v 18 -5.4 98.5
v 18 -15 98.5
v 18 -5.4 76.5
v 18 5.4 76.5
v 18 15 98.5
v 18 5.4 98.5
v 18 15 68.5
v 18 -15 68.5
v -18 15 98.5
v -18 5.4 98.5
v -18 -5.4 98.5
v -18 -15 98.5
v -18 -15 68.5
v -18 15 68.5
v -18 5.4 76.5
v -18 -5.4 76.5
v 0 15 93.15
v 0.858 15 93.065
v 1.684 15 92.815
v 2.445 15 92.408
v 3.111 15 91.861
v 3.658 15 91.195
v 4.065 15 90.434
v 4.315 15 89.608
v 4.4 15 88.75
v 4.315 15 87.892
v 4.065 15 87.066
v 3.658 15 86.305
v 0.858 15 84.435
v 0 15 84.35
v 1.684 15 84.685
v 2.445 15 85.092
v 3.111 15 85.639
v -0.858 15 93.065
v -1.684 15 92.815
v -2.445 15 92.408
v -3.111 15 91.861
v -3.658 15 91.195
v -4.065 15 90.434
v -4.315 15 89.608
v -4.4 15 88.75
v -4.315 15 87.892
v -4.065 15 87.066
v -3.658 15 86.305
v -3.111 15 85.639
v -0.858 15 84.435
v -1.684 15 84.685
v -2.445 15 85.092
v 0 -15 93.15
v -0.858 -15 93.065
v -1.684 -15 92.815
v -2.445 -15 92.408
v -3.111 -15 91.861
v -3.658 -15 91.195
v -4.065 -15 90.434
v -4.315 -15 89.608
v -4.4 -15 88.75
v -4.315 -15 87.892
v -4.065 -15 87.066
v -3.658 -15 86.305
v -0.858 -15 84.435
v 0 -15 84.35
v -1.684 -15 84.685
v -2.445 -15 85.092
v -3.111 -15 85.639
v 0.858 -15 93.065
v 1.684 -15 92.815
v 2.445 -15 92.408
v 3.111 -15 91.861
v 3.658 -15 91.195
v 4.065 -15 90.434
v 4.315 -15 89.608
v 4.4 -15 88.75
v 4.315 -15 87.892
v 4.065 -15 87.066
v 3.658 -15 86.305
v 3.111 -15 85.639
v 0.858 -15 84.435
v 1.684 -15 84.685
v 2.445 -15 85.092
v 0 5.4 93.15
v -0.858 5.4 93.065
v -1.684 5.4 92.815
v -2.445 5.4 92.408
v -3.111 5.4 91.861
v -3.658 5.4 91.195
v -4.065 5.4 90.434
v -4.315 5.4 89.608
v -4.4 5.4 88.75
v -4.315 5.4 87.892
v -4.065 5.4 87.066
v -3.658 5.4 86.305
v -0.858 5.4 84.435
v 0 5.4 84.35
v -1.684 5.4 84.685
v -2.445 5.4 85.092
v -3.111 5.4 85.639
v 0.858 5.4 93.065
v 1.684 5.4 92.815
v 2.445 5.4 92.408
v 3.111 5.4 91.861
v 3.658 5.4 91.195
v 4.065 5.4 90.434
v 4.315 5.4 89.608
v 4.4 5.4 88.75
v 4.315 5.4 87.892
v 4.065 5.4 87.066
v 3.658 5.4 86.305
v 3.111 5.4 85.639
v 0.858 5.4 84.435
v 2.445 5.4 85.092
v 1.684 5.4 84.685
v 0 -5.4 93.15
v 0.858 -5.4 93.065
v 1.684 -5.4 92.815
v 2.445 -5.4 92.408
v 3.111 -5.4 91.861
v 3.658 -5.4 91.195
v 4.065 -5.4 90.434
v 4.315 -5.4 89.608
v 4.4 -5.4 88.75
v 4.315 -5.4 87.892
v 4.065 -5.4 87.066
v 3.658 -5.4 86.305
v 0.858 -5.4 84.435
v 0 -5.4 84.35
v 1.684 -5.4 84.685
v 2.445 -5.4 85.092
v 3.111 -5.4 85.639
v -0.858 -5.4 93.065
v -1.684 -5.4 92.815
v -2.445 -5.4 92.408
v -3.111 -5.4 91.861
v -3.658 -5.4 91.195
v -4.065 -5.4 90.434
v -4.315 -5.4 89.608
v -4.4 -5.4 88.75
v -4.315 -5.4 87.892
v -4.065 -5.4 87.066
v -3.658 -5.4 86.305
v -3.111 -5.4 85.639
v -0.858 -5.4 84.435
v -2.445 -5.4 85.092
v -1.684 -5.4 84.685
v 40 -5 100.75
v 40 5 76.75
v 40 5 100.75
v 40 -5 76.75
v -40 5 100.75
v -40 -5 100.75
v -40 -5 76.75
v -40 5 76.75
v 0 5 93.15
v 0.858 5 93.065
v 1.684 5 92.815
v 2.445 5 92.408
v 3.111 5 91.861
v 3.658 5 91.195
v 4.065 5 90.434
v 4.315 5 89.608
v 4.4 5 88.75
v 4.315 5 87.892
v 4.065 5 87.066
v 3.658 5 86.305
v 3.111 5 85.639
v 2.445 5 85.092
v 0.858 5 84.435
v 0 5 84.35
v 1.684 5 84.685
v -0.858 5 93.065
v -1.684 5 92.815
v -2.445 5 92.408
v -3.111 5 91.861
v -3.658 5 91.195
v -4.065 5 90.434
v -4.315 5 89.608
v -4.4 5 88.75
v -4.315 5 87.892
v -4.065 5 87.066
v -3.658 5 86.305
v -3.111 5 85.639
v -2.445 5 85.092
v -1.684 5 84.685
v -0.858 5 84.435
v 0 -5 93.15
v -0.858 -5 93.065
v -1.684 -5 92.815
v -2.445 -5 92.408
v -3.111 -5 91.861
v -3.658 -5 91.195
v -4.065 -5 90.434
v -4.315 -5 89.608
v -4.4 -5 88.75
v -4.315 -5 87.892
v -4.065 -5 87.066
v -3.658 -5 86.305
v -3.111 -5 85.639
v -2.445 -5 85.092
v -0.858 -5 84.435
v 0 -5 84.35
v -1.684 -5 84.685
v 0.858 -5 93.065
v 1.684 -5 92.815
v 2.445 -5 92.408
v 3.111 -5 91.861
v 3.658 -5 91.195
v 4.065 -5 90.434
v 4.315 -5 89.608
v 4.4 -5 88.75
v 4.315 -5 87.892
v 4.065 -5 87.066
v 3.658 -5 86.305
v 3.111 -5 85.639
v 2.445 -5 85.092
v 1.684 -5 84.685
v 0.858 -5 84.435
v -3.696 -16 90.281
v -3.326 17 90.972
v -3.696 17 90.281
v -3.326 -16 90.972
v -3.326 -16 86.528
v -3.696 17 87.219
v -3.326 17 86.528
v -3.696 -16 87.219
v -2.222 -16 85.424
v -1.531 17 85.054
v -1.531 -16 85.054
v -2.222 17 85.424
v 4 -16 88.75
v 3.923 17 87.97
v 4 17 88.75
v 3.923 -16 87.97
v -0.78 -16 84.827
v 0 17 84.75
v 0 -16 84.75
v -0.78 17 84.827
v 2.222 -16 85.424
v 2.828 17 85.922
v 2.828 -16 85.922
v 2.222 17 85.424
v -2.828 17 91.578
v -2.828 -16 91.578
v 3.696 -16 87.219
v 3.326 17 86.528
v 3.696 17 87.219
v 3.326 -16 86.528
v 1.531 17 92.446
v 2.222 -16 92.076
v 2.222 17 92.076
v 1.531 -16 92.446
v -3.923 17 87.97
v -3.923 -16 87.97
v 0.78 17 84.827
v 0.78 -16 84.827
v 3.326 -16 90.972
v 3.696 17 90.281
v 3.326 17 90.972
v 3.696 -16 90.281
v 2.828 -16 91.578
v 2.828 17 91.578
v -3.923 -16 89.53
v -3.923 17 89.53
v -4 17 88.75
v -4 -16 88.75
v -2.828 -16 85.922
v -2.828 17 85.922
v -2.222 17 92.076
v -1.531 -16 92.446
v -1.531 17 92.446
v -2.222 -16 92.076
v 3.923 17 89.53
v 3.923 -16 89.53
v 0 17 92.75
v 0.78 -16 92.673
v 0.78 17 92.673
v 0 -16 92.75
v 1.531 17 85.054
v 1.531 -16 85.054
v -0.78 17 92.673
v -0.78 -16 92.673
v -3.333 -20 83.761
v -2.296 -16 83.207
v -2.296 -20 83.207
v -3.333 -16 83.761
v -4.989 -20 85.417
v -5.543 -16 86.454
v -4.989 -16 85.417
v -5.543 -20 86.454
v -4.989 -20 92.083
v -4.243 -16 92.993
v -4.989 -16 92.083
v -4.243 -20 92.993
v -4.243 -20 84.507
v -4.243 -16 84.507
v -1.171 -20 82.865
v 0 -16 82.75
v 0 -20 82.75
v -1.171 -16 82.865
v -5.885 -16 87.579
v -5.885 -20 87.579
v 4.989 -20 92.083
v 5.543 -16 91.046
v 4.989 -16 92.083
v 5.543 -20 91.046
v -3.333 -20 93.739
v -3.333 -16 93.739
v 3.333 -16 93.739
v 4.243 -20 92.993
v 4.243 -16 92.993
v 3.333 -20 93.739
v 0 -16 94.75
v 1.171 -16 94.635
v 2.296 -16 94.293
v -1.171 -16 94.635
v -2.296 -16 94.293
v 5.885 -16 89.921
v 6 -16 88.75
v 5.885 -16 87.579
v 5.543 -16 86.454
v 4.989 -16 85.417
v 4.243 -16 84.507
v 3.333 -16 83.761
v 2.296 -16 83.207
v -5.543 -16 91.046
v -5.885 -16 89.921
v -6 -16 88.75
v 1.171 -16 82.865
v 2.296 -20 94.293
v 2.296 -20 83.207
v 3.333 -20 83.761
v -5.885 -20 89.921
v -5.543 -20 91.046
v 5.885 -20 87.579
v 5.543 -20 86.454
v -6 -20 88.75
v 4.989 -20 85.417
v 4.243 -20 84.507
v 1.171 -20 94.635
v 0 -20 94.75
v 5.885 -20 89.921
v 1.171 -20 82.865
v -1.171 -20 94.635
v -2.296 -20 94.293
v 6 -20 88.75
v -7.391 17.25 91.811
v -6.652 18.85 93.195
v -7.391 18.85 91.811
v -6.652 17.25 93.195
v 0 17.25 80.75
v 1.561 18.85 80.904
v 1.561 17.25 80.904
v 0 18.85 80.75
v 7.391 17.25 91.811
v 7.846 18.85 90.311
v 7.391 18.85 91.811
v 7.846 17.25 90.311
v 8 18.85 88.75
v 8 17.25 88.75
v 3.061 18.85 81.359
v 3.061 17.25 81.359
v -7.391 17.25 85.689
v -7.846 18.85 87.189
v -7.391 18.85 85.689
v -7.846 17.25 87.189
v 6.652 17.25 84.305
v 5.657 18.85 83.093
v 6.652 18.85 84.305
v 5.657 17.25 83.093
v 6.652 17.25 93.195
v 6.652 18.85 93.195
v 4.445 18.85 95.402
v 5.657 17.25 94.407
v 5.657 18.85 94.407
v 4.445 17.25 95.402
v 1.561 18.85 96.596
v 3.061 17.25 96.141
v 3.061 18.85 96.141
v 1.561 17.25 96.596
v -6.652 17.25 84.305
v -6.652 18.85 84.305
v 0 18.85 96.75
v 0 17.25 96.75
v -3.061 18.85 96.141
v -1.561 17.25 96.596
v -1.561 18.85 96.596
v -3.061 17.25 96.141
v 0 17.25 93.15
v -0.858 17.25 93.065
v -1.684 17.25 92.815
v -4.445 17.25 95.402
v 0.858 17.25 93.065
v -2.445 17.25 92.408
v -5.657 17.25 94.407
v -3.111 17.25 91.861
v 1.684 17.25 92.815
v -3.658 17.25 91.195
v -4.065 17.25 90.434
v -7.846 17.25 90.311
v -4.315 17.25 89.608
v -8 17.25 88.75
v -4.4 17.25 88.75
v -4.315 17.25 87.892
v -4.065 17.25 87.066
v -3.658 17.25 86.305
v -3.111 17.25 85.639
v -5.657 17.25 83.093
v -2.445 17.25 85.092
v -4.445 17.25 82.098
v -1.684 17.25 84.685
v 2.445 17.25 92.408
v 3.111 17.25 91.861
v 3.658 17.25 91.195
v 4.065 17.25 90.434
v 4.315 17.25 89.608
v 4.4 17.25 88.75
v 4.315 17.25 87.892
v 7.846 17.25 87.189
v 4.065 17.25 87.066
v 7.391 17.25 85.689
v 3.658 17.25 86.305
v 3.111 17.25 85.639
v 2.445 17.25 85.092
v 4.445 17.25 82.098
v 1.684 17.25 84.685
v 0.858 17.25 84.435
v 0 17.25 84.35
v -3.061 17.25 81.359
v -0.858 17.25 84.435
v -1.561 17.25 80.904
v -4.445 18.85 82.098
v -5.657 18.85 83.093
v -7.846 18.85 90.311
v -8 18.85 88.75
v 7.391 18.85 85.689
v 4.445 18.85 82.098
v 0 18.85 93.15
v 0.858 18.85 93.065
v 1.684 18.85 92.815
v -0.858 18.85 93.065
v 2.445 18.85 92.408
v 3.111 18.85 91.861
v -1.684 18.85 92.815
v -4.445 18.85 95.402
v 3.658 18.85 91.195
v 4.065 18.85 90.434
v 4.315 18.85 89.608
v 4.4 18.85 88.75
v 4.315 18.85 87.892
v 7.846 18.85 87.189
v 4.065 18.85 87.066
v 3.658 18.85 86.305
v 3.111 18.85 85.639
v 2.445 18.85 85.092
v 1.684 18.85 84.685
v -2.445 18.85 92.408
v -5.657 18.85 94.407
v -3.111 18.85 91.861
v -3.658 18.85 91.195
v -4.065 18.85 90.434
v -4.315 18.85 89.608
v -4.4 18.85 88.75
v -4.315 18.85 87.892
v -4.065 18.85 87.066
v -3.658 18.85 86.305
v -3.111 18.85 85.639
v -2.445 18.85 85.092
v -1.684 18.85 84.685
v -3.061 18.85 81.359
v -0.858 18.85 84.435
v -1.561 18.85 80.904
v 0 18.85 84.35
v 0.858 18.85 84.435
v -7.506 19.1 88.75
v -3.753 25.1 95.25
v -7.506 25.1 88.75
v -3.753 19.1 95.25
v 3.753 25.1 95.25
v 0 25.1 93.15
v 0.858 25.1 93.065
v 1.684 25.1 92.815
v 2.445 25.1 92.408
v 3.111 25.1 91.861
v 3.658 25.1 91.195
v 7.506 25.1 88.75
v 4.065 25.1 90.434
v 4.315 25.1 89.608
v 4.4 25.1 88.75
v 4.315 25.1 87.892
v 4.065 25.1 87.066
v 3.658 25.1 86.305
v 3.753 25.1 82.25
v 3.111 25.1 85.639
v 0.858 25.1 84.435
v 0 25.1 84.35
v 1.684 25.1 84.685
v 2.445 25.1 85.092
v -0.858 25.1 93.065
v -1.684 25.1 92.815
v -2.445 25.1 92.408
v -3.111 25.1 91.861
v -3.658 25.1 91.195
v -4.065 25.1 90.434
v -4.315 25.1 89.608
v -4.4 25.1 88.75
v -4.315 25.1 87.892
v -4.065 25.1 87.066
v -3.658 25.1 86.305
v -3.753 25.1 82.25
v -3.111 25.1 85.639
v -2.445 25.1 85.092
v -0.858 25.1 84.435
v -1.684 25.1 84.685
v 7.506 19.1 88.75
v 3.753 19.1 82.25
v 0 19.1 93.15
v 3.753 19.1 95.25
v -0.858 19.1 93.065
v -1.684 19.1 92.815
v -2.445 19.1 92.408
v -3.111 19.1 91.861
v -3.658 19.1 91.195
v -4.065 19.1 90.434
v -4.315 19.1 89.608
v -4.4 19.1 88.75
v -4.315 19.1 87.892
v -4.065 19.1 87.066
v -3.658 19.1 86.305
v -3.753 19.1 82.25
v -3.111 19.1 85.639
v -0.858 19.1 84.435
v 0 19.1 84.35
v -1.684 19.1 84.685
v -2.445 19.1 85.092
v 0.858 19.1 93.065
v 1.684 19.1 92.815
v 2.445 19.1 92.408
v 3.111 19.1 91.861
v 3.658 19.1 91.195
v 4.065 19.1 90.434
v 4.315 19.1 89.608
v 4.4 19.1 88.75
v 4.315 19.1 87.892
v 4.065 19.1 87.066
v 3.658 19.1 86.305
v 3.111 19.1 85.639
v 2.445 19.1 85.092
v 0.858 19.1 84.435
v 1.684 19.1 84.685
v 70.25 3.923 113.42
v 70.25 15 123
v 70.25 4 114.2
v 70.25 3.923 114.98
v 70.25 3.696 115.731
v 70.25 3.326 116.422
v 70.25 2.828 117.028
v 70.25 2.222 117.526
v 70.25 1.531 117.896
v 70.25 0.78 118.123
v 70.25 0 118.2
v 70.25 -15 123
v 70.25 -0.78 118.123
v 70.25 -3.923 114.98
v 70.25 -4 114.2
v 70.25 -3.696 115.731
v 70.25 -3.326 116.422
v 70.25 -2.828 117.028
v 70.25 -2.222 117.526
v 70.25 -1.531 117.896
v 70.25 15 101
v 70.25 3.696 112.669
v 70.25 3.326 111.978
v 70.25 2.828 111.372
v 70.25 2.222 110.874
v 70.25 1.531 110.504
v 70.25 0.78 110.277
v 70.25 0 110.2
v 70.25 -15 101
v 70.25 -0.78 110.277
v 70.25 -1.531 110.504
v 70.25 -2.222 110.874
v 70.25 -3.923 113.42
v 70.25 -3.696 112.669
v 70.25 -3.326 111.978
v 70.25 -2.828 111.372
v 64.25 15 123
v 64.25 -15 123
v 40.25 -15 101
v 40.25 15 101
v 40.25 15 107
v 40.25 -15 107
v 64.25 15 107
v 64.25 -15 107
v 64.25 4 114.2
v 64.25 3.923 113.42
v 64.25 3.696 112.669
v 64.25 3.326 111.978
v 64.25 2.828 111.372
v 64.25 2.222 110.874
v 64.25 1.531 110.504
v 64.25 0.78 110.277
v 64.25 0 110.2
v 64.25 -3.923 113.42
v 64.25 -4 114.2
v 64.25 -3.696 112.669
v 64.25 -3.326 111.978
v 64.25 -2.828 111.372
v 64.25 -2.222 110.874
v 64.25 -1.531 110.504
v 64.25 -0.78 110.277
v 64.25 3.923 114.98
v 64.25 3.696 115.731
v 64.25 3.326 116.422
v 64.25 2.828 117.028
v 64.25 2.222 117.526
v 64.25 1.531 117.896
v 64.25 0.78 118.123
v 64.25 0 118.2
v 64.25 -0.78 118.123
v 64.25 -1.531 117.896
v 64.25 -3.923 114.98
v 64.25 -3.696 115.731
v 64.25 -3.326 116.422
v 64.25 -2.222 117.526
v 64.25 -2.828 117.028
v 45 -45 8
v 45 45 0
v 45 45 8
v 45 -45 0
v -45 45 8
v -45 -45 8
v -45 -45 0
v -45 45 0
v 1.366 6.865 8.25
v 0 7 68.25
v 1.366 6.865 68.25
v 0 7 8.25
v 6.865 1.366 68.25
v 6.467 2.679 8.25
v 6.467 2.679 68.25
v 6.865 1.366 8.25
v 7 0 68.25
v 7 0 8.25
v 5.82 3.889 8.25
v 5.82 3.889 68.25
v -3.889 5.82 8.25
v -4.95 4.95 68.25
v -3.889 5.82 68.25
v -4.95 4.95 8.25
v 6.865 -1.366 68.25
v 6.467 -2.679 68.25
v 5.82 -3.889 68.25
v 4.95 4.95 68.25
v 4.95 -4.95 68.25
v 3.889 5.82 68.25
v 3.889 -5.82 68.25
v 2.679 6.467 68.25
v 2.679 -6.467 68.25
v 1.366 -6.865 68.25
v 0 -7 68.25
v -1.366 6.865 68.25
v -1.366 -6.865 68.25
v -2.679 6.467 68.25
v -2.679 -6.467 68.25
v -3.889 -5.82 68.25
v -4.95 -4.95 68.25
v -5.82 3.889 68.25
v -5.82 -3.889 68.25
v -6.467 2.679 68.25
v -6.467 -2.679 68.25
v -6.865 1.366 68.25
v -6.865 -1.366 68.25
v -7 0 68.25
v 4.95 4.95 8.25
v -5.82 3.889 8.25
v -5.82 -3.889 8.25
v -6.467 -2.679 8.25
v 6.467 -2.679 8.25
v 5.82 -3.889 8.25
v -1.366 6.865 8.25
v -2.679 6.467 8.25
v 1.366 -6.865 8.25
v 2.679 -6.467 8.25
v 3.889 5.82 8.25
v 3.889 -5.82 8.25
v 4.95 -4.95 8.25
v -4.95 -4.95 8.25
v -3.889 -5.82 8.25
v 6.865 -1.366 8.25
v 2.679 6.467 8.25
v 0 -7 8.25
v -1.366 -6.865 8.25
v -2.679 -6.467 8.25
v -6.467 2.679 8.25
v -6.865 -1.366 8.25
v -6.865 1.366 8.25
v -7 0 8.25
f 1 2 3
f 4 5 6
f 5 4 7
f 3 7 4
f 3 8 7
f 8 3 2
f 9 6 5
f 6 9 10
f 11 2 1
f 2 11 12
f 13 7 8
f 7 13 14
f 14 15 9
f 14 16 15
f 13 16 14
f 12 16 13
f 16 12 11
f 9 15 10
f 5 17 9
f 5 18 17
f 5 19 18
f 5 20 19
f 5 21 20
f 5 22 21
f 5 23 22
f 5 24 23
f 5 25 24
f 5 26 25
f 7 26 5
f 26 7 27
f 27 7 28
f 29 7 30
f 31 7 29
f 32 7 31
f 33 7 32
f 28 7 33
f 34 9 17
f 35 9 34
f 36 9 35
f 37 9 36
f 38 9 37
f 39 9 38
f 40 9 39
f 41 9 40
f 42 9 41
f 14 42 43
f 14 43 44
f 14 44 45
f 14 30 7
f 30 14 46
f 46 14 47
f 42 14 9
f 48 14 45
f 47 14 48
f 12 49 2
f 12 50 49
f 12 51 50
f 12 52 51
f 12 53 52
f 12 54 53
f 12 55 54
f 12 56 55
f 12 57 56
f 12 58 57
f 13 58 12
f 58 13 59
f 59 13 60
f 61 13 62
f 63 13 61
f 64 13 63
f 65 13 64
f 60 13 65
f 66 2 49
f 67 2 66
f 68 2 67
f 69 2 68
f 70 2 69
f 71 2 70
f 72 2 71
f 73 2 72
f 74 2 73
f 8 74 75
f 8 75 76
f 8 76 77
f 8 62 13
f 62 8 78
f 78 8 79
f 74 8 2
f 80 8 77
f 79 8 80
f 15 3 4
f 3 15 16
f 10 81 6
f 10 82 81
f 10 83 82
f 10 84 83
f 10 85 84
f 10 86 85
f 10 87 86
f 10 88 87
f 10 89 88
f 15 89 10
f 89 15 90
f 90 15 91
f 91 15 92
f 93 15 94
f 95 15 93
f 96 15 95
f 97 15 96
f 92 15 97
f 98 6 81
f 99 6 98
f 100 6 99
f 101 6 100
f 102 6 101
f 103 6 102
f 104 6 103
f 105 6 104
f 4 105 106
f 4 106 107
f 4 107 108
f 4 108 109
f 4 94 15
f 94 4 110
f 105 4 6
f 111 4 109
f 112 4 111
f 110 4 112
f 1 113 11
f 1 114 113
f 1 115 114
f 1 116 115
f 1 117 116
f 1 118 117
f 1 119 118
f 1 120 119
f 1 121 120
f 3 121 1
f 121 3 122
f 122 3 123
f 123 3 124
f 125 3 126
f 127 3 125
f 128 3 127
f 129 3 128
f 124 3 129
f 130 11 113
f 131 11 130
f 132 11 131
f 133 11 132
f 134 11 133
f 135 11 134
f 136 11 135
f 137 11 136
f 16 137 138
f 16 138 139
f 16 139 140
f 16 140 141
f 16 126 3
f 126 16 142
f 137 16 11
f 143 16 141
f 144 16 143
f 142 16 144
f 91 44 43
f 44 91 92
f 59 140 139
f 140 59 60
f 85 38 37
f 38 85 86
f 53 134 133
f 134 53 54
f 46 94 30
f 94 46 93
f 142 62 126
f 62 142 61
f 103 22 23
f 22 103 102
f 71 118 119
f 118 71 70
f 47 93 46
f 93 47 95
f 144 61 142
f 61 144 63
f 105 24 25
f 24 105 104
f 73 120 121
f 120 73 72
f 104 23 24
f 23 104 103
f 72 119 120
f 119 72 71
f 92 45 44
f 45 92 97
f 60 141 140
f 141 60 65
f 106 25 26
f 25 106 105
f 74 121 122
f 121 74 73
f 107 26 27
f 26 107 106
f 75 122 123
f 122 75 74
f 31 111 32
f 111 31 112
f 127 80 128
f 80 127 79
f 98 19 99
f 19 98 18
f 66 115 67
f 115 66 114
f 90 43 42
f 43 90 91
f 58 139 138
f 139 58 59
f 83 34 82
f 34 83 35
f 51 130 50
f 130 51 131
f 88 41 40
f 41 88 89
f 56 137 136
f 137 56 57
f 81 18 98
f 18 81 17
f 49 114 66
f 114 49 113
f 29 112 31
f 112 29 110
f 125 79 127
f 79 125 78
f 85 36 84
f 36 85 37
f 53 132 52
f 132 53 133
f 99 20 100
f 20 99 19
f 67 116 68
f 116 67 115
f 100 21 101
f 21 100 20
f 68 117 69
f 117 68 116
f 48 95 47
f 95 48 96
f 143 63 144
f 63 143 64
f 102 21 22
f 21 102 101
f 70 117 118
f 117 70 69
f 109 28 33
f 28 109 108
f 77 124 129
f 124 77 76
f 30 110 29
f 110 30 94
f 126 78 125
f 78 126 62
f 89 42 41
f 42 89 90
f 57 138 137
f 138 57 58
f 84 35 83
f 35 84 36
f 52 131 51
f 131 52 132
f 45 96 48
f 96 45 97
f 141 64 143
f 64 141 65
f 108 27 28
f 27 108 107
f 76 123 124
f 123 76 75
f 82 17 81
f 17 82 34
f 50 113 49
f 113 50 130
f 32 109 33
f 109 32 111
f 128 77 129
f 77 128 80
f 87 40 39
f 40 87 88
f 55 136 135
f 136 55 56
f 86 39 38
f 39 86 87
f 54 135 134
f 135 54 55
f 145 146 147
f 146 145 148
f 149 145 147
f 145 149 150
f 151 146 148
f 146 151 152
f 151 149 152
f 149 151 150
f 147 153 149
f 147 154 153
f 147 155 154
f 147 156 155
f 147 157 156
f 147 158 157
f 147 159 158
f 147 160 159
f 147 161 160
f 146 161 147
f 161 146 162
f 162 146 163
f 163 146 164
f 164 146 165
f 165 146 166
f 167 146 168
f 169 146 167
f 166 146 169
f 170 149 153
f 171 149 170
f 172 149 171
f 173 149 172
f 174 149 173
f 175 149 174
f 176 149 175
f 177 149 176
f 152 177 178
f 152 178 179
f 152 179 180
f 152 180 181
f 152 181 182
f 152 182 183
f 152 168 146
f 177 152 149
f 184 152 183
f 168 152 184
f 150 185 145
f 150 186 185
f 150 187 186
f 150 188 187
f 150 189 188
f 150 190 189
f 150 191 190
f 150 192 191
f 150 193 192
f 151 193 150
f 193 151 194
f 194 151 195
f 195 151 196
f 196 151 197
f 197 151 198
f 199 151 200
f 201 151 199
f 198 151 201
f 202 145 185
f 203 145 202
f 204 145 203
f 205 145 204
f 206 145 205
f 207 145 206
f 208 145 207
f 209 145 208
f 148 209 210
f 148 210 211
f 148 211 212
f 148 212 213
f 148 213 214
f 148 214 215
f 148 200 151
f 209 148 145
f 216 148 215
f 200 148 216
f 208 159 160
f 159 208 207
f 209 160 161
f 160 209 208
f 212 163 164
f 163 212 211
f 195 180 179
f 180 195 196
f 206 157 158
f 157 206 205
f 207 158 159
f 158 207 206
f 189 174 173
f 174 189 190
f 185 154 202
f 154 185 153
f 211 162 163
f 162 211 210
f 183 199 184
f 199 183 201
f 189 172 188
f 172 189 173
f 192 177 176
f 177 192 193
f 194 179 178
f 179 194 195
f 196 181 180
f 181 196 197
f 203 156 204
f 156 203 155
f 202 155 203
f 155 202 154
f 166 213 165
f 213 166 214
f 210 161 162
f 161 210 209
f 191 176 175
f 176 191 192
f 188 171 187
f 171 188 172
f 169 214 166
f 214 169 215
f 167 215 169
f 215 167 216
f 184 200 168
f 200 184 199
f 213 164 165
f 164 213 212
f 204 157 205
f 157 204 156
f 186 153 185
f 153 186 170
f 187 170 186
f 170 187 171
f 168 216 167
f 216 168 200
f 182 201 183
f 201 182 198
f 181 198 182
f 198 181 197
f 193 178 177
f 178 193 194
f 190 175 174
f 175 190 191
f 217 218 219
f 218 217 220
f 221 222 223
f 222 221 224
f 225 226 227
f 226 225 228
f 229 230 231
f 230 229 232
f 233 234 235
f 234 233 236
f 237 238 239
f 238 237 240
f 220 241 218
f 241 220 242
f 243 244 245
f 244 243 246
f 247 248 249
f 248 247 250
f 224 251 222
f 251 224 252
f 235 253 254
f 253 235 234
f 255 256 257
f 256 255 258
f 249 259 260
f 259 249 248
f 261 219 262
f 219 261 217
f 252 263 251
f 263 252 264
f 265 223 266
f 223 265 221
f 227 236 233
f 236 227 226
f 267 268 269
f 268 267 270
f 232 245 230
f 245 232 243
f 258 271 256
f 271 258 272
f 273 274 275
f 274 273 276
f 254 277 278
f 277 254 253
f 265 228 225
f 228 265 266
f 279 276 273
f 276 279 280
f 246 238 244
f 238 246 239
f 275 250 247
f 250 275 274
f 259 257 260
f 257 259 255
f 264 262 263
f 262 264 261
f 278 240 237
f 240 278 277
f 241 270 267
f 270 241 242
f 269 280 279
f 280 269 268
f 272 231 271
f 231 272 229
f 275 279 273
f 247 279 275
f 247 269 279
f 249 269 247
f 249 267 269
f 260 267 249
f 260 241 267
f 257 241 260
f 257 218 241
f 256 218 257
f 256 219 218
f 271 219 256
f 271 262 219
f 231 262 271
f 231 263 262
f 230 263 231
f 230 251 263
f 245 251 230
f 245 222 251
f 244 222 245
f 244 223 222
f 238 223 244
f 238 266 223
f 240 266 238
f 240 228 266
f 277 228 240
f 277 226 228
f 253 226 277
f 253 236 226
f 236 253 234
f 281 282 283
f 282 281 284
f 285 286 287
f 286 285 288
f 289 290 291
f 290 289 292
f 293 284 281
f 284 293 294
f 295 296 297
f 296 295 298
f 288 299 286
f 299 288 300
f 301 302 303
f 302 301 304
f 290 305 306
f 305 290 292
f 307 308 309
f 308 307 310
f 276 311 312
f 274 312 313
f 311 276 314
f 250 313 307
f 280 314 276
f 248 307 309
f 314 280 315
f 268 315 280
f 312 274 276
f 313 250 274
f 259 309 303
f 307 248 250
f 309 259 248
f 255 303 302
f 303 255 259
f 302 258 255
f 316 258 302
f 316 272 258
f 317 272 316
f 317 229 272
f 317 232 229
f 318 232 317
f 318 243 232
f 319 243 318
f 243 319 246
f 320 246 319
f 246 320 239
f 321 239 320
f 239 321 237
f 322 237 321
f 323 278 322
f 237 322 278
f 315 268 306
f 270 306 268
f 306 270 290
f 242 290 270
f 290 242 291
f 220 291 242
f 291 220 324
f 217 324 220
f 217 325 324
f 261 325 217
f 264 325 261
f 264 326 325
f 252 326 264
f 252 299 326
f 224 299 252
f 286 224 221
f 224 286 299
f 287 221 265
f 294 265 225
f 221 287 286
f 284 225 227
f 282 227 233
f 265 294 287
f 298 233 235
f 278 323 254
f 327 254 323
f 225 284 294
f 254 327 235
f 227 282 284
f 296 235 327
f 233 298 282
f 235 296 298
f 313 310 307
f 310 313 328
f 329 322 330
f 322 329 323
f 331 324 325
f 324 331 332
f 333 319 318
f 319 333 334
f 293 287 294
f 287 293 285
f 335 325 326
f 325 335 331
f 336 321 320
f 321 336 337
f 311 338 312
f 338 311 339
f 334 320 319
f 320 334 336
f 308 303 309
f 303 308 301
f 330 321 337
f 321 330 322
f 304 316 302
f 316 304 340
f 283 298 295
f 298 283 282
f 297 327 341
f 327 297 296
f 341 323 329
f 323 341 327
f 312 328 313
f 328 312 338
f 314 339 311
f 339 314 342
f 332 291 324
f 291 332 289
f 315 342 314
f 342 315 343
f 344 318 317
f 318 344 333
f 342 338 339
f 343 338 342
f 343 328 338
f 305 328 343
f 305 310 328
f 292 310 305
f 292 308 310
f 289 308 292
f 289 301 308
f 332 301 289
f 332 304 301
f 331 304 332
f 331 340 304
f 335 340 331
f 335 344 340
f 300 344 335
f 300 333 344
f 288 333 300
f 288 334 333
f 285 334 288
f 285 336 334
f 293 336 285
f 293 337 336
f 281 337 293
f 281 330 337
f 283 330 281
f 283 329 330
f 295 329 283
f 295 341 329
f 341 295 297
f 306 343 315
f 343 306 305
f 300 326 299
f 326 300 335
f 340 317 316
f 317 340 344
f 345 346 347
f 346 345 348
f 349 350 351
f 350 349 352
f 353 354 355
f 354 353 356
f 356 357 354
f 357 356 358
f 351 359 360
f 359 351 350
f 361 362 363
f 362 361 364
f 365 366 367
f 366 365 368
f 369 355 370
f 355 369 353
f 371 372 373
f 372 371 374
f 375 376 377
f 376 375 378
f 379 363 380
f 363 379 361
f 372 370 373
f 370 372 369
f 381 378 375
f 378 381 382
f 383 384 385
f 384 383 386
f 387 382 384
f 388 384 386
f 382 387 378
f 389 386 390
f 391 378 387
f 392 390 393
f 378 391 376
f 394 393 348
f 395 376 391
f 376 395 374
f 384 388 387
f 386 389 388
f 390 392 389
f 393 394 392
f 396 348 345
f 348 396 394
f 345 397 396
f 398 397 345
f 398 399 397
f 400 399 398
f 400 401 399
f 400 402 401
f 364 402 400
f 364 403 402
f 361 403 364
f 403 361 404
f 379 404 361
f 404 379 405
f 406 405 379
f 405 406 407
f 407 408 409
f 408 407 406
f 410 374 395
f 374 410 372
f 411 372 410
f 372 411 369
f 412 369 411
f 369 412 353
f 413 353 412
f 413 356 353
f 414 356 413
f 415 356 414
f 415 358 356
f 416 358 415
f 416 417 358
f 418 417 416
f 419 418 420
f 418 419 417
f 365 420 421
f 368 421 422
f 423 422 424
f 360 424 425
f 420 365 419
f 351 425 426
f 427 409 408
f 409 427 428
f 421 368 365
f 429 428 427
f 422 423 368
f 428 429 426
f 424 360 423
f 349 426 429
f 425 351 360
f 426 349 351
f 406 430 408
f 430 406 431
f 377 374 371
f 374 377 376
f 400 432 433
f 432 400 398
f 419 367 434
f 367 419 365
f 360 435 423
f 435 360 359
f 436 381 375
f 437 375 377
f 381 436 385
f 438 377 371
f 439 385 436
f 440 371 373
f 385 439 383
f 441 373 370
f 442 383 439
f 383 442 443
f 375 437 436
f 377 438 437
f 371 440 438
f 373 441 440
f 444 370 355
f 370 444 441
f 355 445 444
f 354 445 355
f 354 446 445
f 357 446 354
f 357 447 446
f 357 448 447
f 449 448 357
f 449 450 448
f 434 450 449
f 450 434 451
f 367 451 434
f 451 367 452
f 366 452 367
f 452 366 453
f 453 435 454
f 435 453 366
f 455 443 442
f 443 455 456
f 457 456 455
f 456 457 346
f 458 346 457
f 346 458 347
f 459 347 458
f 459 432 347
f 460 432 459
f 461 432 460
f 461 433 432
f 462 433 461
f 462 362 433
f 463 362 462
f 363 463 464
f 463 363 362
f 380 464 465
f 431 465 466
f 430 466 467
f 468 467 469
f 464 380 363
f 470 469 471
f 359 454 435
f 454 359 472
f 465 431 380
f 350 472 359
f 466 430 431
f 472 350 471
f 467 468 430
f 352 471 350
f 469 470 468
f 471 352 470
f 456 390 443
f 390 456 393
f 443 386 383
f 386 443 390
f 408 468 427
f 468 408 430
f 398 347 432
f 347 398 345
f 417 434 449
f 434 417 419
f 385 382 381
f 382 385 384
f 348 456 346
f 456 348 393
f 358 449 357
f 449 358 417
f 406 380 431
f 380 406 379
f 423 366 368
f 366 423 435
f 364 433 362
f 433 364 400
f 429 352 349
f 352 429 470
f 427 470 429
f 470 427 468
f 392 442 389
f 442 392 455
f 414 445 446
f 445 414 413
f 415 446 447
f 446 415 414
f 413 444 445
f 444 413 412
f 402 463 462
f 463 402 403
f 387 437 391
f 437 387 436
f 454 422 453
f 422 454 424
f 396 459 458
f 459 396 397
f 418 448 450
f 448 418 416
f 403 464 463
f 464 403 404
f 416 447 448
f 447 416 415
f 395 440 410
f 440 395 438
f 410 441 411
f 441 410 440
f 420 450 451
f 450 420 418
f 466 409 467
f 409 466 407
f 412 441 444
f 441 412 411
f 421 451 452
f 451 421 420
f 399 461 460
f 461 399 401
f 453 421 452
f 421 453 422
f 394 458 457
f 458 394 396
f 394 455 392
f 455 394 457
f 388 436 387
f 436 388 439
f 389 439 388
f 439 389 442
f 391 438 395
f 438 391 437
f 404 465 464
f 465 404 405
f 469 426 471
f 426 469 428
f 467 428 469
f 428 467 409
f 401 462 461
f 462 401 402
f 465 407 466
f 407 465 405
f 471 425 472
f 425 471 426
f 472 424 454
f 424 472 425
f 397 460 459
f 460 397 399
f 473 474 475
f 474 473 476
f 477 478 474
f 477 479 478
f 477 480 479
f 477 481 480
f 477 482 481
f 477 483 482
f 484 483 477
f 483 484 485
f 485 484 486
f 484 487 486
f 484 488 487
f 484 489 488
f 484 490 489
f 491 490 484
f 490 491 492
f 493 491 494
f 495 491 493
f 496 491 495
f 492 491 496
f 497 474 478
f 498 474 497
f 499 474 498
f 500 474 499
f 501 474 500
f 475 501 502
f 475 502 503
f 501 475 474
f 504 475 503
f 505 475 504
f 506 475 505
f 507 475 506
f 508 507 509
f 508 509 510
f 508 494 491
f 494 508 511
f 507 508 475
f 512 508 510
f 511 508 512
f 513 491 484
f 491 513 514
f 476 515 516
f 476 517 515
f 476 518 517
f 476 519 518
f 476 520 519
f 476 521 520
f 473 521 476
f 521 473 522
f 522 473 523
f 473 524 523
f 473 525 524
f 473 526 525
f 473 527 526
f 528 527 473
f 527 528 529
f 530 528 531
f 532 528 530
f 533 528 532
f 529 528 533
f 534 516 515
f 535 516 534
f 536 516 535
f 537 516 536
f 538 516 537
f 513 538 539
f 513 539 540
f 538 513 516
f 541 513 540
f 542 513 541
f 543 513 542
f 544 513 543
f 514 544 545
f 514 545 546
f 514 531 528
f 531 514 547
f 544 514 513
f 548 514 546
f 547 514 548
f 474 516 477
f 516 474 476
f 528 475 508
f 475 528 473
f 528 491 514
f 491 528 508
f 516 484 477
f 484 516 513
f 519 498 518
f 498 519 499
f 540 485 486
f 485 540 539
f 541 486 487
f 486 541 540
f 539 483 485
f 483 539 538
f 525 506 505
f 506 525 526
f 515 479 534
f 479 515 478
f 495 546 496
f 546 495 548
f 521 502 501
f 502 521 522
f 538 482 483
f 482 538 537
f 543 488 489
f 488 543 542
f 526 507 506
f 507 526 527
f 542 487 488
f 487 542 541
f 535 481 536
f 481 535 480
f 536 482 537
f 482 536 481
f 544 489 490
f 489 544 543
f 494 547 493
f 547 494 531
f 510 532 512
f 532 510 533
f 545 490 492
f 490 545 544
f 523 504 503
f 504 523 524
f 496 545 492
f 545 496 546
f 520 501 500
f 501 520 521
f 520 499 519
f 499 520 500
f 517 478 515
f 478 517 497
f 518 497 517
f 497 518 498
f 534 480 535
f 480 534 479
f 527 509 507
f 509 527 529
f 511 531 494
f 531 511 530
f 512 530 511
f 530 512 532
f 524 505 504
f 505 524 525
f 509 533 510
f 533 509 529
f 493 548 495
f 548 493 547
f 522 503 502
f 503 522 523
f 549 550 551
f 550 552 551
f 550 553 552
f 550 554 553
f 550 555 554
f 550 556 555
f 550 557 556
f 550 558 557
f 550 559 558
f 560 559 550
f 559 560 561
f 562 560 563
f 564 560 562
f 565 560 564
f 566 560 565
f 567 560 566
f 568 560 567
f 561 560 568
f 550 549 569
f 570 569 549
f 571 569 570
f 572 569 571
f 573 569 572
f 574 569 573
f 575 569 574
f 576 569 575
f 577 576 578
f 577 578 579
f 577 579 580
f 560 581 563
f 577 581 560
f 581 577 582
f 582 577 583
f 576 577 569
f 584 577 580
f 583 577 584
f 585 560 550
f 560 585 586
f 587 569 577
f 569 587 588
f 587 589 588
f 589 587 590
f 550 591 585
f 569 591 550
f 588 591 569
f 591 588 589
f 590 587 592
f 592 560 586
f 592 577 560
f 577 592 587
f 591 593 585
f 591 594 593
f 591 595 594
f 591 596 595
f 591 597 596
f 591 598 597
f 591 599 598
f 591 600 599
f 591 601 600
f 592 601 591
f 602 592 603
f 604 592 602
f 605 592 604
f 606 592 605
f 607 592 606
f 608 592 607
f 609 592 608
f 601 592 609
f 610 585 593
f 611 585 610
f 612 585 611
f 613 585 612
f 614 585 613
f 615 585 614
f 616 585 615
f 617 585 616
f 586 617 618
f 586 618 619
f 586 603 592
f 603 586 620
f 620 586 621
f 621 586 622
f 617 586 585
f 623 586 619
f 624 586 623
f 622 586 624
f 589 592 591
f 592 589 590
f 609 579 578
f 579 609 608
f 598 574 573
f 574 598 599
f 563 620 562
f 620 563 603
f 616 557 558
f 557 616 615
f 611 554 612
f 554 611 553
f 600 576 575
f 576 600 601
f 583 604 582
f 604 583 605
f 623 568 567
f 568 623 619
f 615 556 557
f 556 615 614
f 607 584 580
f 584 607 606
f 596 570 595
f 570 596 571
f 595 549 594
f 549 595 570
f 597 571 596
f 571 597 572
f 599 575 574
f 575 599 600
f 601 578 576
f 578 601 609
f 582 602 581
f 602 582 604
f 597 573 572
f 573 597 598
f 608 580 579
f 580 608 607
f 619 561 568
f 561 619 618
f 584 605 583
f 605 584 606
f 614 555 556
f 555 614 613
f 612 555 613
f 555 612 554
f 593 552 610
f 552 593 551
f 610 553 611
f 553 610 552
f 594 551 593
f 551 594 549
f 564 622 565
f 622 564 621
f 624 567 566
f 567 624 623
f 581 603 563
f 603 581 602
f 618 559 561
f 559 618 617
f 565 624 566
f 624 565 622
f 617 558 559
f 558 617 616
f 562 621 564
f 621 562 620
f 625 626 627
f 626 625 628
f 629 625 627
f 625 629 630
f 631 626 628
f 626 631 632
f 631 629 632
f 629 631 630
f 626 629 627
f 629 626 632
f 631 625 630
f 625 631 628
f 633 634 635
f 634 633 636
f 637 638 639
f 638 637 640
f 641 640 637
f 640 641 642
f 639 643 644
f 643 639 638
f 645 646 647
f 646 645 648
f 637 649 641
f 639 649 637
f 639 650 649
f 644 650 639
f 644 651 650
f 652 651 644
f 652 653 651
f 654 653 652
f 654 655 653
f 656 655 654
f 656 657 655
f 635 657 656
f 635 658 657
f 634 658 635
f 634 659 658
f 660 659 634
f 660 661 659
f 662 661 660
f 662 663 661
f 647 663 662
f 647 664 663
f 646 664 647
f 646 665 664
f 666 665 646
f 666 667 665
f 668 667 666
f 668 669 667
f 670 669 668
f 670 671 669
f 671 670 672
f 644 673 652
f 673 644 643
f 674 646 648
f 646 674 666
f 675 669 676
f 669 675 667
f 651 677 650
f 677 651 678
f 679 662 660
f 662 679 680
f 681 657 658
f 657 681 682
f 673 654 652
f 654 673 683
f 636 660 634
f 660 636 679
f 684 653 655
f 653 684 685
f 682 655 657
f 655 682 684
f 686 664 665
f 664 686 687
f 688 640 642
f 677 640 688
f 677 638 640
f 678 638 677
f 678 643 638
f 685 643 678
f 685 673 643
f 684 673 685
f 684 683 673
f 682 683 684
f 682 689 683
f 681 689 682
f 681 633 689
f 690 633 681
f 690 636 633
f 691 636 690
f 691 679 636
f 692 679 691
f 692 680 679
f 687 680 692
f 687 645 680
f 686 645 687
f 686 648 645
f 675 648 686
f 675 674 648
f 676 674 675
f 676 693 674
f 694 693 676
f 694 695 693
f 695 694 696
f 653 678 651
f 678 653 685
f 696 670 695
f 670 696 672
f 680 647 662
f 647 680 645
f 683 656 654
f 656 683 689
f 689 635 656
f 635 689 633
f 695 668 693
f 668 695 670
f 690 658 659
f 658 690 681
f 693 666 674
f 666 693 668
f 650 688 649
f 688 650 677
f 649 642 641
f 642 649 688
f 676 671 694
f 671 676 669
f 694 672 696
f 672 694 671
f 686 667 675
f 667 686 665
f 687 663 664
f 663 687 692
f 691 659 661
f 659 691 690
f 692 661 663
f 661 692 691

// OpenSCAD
$fn = 32;

// ------------------------------------------------------------------------
// Lamp arm: column d14 x 60 mm, arm 80 mm
// Every part is its own module, assembly() places every instance.
// ------------------------------------------------------------------------

// --- part 1 ---
module lamp_base() {
  difference() {
    translate([-45, -45, 0]) cube([90, 90, 8]);
  }
}

// --- part 2 ---
module lamp_column() {
  cylinder(h = 60, d = 14);
}

// --- part 3 ---
module head_fork() {
  difference() {
    translate([-18, -15, 0]) cube([36, 30, 30]);
    translate([-19, -5.4, 8]) cube([38, 10.8, 23]);
    translate([0, 0, 20.25]) rotate([90, 0, 0]) cylinder(h = 32, d = 8.8, center = true);
  }
}

// --- part 4 ---
module lamp_arm() {
  difference() {
    translate([-40, -5, 0]) cube([80, 10, 24]);
    translate([0, 0, 12]) rotate([90, 0, 0]) cylinder(h = 12, d = 8.8, center = true);
  }
}

// --- part 5 ---
module arm_pin() {
  rotate([0, 90, 0]) cylinder(h = 34, d = 8, center = true);
  translate([-20, 0, 0]) rotate([0, 90, 0]) cylinder(h = 4, d = 12);
}

// --- part 6 ---
module arm_washer() {
  difference() {
      translate([0, 0, 0]) cylinder(h = 1.6, d = 16);
      translate([0, 0, -1]) cylinder(h = 3.6, d = 8.8);
    }
}

// --- part 7 ---
module arm_nut() {
  difference() {
    linear_extrude(height = 6) polygon(points = [[7.506, 0], [3.753, 6.5], [-3.753, 6.5], [-7.506, 0], [-3.753, -6.5], [3.753, -6.5]]);
    translate([0, 0, -1]) cylinder(h = 8, d = 8.8);
  }
}

// --- part 8 ---
module shade_bracket() {
  difference() {
    translate([-15, -15, 0]) cube([30, 30, 22]);
    translate([-16, -16, 6]) cube([25, 32, 17]);
    translate([12, 0, 13.2]) rotate([0, 90, 0]) cylinder(h = 8, d = 8, center = true);
  }
}

// --- assembly ---
module assembly() {
  color([0.80, 0.24, 0.20]) translate([0, 0, 0]) rotate([0, 0, 0]) lamp_base();
  color([0.20, 0.45, 0.75]) translate([0, 0, 8.25]) rotate([0, 0, 0]) lamp_column();
  color([0.25, 0.62, 0.32]) translate([0, 0, 68.5]) rotate([0, 0, 0]) head_fork();
  color([0.92, 0.70, 0.18]) translate([0, 0, 76.75]) rotate([0, 0, 0]) lamp_arm();
  color([0.58, 0.35, 0.70]) translate([0, 0, 88.75]) rotate([0, 0, 90]) arm_pin();
  color([0.16, 0.66, 0.66]) translate([0, 18.85, 88.75]) rotate([90, 0, 0]) arm_washer();
  color([0.85, 0.48, 0.18]) translate([0, 25.1, 88.75]) rotate([90, 0, 0]) arm_nut();
  color([0.55, 0.60, 0.65]) translate([55.25, 0, 101]) rotate([0, 0, 0]) shade_bracket();
}

assembly();
